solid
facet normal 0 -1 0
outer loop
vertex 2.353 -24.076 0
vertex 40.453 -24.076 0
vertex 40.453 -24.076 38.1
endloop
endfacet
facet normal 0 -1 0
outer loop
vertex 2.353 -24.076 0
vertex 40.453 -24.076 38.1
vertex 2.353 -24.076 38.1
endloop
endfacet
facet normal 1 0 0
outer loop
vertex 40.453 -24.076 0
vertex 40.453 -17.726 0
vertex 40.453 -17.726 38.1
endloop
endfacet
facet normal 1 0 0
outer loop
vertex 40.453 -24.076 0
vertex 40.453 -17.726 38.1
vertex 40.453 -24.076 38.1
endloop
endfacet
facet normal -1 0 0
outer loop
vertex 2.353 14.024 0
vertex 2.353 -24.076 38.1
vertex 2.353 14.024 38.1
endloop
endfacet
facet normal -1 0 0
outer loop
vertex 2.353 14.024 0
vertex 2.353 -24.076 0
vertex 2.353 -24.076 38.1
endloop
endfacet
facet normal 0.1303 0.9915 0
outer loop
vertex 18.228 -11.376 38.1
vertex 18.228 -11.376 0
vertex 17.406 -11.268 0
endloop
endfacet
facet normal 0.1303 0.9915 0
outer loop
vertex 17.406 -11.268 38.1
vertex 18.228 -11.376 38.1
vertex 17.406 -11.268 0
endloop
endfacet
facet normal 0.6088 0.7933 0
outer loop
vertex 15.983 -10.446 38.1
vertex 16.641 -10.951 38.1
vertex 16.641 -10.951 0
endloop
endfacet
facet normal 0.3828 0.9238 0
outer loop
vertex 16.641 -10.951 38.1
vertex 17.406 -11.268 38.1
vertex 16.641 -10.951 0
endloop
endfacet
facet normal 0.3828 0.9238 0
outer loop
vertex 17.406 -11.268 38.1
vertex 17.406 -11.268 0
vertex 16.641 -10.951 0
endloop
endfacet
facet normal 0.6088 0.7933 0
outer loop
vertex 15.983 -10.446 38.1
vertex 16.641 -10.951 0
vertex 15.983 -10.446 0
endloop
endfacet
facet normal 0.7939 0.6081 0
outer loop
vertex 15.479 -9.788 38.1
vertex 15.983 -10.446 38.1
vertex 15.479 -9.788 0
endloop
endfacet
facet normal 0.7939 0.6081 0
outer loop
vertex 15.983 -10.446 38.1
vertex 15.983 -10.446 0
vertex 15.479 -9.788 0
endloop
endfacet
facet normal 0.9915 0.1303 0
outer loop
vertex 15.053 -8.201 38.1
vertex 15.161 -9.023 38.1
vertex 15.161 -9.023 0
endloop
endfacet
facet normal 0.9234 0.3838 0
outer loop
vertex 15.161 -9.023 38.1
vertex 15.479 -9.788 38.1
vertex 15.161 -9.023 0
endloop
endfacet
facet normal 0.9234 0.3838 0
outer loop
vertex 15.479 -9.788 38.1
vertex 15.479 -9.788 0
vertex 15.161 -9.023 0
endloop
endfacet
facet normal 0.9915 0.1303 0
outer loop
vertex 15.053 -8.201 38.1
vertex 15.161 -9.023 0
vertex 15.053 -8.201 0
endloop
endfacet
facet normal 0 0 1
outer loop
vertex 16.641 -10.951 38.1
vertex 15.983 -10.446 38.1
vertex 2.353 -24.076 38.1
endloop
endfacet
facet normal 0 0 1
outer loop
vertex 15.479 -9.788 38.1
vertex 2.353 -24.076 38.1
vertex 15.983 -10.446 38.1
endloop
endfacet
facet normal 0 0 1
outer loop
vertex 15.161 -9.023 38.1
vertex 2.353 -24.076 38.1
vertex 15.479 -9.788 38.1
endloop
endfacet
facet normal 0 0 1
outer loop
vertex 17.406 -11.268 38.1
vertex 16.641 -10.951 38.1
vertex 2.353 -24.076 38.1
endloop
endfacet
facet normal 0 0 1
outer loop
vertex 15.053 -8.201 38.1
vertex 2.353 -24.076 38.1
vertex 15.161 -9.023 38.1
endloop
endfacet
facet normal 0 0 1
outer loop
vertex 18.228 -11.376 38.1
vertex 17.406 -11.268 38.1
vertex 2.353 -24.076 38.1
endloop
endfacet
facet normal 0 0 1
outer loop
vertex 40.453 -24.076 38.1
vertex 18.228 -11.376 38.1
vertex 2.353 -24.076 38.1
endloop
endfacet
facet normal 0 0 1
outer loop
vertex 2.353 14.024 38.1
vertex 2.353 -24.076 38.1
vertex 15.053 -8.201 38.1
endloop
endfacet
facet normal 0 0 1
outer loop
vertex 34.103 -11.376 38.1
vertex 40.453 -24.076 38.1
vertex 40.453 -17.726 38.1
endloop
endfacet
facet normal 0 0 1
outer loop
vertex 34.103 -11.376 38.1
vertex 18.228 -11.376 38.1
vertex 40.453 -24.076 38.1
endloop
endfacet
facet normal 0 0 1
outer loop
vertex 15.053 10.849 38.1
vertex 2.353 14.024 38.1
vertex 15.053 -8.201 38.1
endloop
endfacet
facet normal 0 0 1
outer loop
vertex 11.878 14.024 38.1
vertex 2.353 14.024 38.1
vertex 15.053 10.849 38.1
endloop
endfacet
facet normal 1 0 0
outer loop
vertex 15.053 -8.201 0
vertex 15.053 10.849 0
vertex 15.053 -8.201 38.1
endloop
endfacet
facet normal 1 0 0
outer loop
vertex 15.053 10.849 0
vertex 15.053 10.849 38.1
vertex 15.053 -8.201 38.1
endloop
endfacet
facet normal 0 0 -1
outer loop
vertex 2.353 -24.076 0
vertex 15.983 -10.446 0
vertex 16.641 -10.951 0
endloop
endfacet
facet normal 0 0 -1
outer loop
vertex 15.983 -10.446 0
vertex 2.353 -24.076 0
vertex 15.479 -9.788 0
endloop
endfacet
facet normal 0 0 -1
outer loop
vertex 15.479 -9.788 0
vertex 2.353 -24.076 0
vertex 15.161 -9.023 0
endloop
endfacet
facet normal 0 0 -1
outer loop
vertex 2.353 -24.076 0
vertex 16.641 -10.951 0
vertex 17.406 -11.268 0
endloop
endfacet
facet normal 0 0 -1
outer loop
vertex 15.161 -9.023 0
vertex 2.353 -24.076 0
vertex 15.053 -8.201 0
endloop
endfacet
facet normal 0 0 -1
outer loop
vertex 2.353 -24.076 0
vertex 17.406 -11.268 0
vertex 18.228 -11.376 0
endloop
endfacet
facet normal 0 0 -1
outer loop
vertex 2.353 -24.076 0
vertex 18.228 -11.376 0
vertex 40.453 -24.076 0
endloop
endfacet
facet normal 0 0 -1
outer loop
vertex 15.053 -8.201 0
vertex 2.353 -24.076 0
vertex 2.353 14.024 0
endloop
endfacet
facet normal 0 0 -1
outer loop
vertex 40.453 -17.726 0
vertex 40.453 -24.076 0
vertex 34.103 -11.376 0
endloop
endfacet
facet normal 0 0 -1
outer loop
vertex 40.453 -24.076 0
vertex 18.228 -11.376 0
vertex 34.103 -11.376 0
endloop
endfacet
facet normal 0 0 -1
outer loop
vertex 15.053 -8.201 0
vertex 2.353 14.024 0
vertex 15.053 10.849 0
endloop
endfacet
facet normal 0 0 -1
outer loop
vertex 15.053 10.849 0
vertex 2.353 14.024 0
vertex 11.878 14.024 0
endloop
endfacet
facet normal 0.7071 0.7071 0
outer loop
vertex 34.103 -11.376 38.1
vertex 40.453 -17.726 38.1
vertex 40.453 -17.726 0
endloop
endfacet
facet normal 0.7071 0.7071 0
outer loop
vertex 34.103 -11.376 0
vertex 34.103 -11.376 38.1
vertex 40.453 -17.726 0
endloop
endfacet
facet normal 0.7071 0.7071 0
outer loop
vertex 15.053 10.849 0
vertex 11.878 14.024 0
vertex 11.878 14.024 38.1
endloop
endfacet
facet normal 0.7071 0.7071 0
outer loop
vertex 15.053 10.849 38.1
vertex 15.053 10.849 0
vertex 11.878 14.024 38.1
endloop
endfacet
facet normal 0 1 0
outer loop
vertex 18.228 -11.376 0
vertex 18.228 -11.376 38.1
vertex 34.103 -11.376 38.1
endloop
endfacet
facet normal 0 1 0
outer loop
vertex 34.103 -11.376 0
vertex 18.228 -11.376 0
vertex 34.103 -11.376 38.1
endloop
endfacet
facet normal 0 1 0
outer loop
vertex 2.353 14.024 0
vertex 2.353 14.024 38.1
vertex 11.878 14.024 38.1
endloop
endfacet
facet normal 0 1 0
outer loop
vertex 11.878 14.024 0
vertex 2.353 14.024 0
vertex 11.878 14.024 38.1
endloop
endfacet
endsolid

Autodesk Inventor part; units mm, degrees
ref_plane "YZ Plane" through (0, 0, 0) normal (1, 0, 0) x (0, 1, 0)
ref_plane "XZ Plane" through (0, 0, 0) normal (0, 1, 0) x (-1, 0, 0)
ref_plane "XY Plane" through (0, 0, 0) normal (0, 0, 1) x (1, 0, 0)
sketch "Sketch1" plane through (0, 0, 0) normal (0, 0, 1) x (1, 0, 0)
  line L0 (2.3532, 14.024) -> (40.4532, 14.024)
  line L1 (40.4532, 14.024) -> (40.4532, -24.076)
  line L2 (40.4532, -24.076) -> (2.3532, -24.076)
  line L3 (2.3532, -24.076) -> (2.3532, 14.024)
  point P0 (0, 0)
  dimension "d0" = 38.1
  dimension "d1" = 38.1
extrude "Extrusion1" add sketch "Sketch1" along normal blind 38.1
sketch "Sketch2" plane through (0, 0, 38.1) normal (0, 0, 1) x (1, 0, 0)
  line L0 (15.0532, 14.024) -> (15.0532, 1.324)
  line L1 (40.4532, 14.024) -> (15.0532, 14.024)
  line L2 (15.0532, 14.024) -> (15.0532, -11.376)
  line L3 (15.0532, -11.376) -> (40.4532, -11.376)
  line L4 (40.4532, -11.376) -> (40.4532, 14.024)
  point P0 (0, 0)
  point P1 (2.3532, 14.024)
  point P2 (40.4532, -24.076)
  dimension "d5" = 12.7
extrude "Extrusion2" cut sketch "Sketch2" against normal through all
fillet "Fillet4" radius 3.175 1 edges at (15.0532, -11.376, 19.05)
chamfer "Chamfer5" distance 3.175 angle 45 1 edges at (15.0532, 14.024, 19.05)
chamfer "Chamfer6" distance 6.35 angle 45 1 edges at (40.4532, -11.376, 19.05)
properties part number "Chamfer Part"
